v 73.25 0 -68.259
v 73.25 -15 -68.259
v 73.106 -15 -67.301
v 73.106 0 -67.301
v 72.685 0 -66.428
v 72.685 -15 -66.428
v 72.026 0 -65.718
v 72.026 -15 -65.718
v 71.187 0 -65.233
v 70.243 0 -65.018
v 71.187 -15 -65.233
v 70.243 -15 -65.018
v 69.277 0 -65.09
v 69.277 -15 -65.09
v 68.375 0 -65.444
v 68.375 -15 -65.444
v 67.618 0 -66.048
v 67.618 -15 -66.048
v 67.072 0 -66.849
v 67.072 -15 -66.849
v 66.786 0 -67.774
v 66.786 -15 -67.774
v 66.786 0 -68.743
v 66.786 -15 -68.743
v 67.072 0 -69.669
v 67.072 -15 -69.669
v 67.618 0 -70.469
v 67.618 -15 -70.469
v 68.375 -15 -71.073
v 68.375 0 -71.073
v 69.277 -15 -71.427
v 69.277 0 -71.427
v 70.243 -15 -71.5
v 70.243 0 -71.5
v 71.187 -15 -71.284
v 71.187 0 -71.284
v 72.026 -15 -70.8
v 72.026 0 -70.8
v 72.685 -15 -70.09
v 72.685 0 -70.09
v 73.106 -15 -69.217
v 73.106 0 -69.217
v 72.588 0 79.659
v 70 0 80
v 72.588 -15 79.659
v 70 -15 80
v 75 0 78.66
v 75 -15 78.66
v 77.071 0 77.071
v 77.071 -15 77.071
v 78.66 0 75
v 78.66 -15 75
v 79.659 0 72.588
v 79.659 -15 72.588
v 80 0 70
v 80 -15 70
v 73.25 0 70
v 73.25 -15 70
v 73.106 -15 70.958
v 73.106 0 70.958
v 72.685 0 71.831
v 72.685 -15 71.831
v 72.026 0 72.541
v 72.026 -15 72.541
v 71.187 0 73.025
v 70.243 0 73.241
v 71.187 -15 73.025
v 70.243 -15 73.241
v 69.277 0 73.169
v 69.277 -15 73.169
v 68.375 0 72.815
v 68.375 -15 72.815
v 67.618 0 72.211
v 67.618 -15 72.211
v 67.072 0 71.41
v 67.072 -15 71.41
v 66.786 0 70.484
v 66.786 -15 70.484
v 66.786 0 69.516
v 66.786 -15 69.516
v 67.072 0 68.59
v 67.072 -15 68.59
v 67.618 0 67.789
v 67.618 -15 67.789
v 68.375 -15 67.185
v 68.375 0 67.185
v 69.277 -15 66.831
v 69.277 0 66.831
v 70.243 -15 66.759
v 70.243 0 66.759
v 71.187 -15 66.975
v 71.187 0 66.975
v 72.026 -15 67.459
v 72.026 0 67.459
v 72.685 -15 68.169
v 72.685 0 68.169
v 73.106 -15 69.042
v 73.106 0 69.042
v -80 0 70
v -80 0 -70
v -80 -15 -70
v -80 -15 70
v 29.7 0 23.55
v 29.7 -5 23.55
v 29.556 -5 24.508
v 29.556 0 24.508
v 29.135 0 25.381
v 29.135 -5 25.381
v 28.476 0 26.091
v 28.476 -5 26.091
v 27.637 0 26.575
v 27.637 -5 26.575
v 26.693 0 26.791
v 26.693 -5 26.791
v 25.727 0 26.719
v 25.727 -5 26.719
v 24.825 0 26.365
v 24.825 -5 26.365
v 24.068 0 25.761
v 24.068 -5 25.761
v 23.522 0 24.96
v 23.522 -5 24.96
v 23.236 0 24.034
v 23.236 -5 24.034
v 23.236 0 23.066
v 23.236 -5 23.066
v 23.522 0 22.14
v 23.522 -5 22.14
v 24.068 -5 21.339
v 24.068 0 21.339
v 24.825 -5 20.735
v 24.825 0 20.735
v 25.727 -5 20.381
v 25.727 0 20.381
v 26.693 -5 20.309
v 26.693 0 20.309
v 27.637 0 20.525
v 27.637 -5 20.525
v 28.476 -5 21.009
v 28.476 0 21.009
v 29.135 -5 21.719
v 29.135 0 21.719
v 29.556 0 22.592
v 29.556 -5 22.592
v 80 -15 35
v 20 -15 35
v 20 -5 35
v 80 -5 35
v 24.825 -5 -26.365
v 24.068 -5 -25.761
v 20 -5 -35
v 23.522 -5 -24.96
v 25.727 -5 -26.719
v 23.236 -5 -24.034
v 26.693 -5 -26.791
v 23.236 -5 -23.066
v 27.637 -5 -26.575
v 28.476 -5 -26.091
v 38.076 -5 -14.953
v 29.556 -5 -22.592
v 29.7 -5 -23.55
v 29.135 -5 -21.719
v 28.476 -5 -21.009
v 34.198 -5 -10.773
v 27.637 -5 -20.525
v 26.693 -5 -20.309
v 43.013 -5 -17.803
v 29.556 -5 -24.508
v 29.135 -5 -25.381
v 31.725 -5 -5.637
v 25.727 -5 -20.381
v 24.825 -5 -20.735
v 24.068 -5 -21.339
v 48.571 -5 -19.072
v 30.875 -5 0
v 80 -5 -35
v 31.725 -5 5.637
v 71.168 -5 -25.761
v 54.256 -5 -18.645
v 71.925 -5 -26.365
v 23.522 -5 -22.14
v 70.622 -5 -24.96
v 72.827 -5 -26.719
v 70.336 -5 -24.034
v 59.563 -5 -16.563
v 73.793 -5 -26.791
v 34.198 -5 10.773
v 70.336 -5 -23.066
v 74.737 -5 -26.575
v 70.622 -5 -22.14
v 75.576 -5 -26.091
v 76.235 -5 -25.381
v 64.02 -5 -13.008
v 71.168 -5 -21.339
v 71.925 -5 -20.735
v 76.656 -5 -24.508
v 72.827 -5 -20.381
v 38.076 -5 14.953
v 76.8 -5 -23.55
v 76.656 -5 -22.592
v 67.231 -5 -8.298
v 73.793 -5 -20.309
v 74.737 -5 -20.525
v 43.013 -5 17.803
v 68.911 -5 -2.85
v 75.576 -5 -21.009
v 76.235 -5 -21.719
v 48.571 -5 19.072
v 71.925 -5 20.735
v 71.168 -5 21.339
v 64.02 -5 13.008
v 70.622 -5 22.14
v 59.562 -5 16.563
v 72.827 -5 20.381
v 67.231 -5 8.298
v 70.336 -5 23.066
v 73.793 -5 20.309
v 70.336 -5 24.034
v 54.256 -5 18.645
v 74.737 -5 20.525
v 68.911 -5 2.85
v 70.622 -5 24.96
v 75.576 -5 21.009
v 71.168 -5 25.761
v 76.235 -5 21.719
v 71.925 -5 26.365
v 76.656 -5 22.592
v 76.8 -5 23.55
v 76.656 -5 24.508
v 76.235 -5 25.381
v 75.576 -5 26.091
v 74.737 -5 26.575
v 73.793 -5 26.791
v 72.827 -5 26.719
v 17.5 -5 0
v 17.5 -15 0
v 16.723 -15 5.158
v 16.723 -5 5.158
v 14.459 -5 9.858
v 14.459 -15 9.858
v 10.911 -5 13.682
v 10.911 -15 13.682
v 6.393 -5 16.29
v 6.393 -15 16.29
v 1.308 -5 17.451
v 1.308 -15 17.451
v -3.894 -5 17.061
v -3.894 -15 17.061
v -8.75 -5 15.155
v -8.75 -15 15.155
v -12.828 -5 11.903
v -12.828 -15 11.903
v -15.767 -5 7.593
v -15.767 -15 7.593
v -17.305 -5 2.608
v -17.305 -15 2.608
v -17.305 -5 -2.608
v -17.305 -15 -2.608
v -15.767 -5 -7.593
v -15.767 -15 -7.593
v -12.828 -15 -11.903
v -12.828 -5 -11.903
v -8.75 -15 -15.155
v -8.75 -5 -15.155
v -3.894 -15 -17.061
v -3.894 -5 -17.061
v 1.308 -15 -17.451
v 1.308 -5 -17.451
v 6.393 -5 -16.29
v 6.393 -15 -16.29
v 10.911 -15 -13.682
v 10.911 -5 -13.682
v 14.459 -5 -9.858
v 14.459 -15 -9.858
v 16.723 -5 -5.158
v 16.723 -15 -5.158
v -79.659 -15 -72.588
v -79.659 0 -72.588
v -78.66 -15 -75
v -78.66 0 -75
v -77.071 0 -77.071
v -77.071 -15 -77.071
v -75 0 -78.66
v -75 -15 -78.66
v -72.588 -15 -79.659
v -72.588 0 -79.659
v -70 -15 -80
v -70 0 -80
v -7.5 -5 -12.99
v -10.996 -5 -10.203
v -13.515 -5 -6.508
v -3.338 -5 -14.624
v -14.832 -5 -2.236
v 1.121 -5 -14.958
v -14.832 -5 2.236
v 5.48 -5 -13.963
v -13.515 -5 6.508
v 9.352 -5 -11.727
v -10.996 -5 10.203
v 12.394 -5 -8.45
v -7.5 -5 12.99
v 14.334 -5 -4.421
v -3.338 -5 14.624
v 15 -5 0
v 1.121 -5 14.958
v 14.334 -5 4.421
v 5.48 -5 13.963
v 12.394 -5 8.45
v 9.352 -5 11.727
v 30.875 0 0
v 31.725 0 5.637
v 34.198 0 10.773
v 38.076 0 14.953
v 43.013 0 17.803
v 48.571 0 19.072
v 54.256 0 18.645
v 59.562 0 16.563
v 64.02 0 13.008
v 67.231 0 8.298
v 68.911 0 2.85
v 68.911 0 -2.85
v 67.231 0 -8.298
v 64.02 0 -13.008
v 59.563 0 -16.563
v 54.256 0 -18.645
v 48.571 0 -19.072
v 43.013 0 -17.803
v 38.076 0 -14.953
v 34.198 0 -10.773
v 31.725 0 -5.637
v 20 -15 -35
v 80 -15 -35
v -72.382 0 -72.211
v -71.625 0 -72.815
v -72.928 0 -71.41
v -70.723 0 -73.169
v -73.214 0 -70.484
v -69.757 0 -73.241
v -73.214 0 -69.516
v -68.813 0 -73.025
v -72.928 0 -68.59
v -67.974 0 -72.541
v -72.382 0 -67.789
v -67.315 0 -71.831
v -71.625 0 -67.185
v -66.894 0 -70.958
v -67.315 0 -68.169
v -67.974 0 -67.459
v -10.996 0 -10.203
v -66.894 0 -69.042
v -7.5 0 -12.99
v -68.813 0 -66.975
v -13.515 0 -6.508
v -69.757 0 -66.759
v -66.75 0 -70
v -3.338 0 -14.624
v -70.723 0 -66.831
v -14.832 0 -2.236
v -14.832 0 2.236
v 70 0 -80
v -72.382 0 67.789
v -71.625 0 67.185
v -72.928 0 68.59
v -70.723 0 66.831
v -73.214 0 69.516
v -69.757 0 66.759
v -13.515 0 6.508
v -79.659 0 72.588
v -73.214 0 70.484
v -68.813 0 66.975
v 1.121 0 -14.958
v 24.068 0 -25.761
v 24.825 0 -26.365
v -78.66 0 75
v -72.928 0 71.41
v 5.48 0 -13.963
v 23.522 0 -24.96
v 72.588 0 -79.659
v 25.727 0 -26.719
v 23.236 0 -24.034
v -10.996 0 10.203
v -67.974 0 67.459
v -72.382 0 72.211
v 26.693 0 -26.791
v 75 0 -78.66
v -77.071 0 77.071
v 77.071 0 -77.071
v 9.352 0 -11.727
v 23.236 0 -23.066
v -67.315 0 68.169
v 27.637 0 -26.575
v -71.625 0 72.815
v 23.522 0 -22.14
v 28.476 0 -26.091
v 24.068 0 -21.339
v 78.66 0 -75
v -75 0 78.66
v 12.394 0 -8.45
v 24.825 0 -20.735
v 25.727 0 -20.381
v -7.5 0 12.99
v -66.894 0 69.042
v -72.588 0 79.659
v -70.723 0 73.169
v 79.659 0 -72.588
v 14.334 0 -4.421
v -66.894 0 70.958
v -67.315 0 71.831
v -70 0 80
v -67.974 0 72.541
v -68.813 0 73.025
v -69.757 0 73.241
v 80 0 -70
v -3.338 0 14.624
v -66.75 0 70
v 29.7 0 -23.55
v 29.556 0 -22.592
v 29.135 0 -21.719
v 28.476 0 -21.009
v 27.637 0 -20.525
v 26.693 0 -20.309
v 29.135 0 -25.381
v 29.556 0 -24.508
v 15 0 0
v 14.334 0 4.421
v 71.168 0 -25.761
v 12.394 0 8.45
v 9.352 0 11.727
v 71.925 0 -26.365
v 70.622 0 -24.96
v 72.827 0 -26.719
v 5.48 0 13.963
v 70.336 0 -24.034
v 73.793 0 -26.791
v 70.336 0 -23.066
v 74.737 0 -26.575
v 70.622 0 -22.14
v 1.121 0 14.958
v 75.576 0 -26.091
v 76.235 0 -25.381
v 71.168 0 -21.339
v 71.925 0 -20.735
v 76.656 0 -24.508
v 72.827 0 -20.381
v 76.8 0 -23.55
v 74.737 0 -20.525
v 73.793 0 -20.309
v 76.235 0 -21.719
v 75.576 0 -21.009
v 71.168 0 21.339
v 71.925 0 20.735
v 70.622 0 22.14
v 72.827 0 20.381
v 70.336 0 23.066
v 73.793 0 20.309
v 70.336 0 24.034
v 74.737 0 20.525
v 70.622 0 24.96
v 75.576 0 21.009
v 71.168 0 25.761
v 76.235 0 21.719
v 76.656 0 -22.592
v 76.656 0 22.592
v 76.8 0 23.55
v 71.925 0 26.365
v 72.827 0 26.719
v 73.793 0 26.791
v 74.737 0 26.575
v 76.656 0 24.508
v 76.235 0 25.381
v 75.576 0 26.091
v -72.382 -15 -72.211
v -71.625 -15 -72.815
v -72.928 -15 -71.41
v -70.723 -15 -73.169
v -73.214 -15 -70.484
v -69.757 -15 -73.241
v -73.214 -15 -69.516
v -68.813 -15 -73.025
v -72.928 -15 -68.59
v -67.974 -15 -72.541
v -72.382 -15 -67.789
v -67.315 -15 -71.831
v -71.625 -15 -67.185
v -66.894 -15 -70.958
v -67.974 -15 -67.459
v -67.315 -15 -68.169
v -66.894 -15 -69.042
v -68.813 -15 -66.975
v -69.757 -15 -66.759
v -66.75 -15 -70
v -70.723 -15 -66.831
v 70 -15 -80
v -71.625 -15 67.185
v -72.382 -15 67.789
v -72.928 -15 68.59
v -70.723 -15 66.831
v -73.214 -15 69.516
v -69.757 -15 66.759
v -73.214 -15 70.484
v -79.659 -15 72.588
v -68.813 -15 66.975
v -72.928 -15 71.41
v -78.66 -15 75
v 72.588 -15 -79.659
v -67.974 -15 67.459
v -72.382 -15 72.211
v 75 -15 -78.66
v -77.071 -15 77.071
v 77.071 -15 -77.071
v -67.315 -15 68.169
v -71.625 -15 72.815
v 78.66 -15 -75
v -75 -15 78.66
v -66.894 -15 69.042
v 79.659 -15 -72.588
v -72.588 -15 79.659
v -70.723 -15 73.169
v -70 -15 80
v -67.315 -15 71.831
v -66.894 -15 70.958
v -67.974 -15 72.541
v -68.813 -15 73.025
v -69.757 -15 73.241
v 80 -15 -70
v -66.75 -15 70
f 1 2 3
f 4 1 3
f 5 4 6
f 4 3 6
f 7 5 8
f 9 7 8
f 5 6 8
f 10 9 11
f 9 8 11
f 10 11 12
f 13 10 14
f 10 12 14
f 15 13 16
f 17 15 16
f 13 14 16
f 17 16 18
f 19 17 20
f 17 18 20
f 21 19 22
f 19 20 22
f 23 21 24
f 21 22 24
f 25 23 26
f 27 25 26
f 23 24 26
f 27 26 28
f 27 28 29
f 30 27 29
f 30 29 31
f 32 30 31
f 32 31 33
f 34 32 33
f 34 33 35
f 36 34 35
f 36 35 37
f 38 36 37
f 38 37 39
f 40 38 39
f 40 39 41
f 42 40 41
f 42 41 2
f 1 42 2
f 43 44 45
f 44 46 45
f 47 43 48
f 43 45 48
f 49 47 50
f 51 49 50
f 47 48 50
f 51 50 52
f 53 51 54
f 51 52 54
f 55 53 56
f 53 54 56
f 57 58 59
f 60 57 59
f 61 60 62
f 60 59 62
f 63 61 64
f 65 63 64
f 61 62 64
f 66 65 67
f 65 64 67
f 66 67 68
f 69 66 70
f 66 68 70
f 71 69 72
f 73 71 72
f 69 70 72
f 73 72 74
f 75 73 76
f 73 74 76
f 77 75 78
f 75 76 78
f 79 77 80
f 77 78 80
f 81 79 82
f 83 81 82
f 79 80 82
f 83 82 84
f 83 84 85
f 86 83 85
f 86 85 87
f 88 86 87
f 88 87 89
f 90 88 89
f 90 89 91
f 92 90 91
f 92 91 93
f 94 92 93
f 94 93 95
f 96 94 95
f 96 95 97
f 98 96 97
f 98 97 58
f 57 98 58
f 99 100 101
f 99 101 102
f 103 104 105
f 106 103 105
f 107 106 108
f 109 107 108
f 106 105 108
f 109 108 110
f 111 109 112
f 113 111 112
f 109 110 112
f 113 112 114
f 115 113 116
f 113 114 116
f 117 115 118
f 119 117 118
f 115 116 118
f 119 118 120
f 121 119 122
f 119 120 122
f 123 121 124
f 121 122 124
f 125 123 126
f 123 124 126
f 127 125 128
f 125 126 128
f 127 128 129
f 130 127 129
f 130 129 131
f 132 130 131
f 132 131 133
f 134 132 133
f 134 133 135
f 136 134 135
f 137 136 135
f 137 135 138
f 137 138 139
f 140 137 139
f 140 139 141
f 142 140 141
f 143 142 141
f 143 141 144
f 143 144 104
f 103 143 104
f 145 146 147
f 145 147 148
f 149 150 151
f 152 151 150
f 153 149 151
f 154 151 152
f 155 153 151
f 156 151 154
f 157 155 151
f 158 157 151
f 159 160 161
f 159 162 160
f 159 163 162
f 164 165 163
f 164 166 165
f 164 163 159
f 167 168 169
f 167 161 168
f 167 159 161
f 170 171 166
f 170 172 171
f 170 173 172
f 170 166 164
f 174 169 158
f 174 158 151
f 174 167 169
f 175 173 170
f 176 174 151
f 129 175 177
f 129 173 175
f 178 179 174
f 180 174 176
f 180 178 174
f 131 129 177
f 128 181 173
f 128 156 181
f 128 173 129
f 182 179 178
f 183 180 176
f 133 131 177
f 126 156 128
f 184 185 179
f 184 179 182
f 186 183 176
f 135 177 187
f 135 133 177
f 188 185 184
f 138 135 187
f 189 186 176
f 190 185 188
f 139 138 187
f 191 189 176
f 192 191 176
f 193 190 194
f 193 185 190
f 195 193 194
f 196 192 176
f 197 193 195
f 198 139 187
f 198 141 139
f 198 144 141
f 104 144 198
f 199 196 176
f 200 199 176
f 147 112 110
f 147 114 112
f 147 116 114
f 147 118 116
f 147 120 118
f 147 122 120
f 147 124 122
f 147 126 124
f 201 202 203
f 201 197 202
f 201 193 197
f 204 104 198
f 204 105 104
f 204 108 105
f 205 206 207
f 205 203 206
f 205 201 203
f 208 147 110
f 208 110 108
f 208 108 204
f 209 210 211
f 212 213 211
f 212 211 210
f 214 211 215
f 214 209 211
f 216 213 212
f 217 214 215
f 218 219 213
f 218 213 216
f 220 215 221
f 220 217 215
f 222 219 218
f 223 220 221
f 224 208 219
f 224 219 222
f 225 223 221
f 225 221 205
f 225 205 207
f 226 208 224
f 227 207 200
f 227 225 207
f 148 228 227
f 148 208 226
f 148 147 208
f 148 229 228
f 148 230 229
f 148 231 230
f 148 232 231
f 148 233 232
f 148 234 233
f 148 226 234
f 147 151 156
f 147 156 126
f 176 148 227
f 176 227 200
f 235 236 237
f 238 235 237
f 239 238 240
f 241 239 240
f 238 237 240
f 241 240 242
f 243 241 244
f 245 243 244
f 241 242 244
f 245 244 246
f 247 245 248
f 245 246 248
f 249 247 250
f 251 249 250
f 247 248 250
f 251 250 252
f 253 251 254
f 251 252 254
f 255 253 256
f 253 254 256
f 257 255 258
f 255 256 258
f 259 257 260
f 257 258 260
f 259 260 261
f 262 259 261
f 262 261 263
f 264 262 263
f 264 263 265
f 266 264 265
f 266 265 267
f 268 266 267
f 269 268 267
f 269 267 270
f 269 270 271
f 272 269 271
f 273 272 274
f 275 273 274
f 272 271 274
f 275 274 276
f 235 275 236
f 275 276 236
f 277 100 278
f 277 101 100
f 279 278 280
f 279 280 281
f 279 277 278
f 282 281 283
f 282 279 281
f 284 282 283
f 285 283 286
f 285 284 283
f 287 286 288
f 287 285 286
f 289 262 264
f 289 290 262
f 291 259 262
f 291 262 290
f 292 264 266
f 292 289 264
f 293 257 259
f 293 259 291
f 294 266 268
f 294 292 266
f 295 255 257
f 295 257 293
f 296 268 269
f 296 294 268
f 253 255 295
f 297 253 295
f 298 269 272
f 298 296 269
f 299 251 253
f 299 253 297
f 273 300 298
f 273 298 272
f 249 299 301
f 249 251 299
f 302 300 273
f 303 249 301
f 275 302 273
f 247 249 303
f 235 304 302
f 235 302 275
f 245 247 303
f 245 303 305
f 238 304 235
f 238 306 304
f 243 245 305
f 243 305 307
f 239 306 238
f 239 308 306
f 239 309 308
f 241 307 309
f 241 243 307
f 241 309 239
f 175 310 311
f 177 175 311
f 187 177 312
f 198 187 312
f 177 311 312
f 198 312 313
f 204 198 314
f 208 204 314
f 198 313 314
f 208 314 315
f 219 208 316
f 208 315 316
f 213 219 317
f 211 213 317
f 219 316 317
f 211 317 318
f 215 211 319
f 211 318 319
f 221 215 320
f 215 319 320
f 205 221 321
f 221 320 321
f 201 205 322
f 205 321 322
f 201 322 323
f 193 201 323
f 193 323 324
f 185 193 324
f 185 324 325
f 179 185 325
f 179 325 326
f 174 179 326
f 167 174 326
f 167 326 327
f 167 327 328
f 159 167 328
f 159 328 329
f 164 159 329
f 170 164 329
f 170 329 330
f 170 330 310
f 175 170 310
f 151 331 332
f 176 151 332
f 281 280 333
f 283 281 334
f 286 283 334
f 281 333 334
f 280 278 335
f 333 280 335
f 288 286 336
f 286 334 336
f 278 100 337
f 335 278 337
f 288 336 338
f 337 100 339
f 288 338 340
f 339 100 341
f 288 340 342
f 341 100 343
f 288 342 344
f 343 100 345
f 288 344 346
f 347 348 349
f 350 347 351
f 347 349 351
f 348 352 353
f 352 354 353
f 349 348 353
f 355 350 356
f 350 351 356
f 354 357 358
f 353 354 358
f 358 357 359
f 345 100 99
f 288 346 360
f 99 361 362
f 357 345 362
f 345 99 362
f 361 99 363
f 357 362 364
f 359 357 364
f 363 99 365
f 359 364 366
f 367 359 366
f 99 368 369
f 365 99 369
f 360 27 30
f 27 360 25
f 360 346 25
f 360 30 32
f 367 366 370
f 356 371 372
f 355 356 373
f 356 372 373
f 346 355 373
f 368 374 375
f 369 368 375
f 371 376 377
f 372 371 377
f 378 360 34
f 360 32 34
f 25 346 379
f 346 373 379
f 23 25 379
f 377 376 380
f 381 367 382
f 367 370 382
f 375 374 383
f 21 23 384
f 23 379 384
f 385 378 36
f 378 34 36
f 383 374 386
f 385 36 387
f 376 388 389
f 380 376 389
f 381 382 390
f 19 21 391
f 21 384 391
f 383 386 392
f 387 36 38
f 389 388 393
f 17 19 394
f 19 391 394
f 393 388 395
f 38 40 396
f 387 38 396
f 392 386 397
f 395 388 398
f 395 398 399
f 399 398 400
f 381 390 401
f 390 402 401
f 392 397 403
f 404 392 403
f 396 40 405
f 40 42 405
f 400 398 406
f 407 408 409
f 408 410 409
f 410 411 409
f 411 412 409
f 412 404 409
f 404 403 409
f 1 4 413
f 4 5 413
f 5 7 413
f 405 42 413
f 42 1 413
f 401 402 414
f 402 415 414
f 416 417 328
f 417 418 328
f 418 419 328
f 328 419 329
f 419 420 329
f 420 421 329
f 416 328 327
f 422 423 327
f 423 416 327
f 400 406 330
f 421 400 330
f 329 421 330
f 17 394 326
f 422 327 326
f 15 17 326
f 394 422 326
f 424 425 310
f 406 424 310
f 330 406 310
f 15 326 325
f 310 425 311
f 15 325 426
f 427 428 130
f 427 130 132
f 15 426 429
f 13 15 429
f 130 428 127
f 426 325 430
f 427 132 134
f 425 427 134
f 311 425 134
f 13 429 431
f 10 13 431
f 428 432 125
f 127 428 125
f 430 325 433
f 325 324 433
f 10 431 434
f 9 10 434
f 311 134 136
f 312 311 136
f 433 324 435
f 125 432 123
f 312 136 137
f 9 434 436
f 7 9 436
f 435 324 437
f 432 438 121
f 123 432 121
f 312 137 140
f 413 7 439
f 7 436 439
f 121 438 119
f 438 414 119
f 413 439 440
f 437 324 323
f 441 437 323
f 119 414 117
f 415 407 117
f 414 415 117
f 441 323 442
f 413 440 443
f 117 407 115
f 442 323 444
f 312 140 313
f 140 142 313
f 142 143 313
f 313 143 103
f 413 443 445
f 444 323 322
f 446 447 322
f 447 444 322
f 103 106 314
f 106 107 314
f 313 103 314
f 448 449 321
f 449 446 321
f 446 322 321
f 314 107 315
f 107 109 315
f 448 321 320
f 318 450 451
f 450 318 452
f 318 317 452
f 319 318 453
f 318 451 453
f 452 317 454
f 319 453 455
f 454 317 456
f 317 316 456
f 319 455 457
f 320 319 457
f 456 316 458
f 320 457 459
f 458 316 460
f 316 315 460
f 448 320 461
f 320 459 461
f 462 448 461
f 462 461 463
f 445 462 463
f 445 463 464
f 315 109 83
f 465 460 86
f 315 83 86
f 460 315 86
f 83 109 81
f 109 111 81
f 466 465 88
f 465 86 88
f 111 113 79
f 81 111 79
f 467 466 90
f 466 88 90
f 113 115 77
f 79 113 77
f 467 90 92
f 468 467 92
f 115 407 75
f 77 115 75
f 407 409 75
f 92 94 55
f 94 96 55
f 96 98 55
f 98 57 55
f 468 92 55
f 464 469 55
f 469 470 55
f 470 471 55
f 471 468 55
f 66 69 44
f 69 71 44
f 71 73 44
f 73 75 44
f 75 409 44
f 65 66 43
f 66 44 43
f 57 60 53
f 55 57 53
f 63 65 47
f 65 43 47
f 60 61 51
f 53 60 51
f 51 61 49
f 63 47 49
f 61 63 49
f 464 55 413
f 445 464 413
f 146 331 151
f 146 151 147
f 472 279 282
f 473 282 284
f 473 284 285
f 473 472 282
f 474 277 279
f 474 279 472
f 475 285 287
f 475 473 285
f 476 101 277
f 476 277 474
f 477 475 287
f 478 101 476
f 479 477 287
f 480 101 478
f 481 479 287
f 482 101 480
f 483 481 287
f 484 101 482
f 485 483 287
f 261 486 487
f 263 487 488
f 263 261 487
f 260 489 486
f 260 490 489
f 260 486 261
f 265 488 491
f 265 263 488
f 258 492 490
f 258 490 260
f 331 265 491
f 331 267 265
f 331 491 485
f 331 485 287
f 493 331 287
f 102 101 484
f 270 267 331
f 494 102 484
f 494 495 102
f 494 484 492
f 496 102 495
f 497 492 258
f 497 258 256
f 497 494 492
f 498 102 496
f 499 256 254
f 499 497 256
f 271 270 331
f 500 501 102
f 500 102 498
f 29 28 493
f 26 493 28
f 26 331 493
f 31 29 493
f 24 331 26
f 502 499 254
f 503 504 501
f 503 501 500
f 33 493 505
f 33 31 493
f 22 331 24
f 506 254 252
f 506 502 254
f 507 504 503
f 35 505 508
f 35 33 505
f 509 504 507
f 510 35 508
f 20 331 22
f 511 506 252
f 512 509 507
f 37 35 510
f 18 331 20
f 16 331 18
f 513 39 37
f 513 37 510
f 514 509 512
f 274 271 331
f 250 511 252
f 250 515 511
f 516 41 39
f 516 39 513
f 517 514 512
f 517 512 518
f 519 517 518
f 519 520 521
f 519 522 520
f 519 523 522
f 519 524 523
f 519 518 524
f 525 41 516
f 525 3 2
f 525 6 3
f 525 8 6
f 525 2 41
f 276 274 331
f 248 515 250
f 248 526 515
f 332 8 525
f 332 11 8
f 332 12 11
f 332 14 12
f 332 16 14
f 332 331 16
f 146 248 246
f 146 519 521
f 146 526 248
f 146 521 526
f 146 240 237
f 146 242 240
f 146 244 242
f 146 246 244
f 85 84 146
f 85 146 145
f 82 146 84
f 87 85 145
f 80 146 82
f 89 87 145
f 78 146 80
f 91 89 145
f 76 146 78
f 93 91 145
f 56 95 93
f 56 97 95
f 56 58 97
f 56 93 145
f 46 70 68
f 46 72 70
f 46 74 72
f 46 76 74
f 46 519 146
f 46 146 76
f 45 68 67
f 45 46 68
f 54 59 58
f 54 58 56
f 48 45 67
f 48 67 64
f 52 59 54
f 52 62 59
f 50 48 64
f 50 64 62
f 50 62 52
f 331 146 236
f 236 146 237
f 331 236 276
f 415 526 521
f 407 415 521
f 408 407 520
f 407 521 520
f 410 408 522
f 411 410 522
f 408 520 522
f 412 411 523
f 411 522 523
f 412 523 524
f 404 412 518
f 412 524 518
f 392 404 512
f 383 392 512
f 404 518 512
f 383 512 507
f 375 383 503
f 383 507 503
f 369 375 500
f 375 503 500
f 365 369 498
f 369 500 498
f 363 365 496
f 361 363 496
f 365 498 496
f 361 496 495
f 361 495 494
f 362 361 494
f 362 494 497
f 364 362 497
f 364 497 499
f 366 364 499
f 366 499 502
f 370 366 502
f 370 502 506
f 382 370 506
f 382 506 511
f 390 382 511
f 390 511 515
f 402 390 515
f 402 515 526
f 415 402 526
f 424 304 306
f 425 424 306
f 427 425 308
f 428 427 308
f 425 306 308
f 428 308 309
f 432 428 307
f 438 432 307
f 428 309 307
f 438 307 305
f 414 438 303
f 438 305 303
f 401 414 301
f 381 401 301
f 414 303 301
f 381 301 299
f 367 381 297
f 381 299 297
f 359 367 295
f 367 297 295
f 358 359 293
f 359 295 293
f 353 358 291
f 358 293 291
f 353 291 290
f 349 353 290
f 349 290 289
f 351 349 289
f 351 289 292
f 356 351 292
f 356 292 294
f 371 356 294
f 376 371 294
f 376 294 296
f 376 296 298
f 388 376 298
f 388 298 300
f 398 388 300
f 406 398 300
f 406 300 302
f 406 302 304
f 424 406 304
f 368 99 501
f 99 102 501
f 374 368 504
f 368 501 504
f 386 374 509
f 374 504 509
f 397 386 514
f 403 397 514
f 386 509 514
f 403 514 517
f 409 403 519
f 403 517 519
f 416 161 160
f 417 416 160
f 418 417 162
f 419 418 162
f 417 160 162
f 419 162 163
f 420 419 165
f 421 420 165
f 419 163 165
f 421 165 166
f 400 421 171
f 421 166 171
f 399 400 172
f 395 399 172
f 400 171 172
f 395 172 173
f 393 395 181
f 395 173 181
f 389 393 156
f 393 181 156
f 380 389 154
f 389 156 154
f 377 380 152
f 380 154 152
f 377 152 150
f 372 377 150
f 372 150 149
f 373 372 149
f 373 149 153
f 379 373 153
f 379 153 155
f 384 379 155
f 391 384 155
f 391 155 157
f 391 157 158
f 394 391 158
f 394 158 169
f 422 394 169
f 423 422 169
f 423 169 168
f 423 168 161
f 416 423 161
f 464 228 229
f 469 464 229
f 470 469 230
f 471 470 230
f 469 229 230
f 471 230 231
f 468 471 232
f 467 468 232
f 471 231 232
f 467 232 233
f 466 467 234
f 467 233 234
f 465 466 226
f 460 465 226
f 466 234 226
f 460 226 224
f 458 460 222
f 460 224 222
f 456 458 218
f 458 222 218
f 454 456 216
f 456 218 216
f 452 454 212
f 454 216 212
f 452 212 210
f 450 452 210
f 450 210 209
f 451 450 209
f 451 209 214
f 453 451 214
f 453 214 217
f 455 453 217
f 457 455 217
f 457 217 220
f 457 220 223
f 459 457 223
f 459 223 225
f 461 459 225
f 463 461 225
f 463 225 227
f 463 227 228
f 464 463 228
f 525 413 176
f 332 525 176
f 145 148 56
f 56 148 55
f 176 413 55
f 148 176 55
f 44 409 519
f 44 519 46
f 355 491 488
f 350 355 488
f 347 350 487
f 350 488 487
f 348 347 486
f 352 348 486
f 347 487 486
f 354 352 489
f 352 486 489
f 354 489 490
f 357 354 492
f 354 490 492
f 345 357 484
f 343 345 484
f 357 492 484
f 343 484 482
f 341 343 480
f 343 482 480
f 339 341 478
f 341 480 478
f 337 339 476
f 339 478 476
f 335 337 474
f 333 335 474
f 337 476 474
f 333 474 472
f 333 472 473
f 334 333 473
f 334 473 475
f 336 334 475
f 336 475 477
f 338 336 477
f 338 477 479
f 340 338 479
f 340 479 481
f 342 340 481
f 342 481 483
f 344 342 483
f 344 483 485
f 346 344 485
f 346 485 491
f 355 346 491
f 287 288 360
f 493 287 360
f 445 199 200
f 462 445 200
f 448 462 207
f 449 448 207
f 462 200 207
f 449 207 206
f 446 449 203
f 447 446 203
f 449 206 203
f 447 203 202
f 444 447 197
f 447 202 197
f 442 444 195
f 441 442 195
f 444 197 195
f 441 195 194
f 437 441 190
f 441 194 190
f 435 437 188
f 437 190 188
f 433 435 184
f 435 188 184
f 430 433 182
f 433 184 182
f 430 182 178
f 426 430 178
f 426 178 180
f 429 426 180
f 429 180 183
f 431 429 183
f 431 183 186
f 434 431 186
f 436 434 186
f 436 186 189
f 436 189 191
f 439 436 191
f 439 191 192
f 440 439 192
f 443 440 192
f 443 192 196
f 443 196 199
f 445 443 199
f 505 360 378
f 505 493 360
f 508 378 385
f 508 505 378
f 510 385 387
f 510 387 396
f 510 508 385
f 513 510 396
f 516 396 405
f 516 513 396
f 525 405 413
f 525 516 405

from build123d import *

# Parameters (mm, degrees)
F0_W      = 160
F0_H      = 160
F1_DEPTH  = 15
F2_R      = 15
F3_DEPTH  = 25
F4_R      = 17.5
F5_DEPTH  = 10
F6_R      = 10
F7_W      = 60
F7_H      = 70
F8_DEPTH  = 10
F9_R      = 19.125
F10_DEPTH = 25
F11_R     = 3.25
F12_DEPTH = 25
F13_R     = 3.25
F14_DEPTH = 25


with BuildPart() as f1:
    # F0 (on Front) → F1 (new body)
    with BuildSketch(Plane.XZ):
        Rectangle(F0_W, F0_H)
    extrude(amount=F1_DEPTH)

    # F2 (on face) → F3 (cut)
    with BuildSketch(Plane.XZ.offset(15)):
        Circle(F2_R)
    extrude(amount=-F3_DEPTH, mode=Mode.SUBTRACT)

    # F4 (on face) → F5 (cut)
    with BuildSketch(Plane.XZ.offset(15)):
        Circle(F4_R)
    extrude(amount=-F5_DEPTH, mode=Mode.SUBTRACT)

    # F6
    f6_edges = [f1.edges().sort_by_distance(p)[0] for p in [
        (80, -7.5, 80),
        (80, -7.5, -80),
        (-80, -7.5, -80),
        (-80, -7.5, 80),
    ]]
    fillet(f6_edges, radius=F6_R)

    # F7 (on face) → F8 (cut)
    with BuildSketch(Plane.XZ.offset(15)):
        with Locations((50, 0)):
            Rectangle(F7_W, F7_H)
    extrude(amount=-F8_DEPTH, mode=Mode.SUBTRACT)

    # F9 (on face) → F10 (cut)
    with BuildSketch(Plane(origin=(0, 0, 0), x_dir=(-1, 0, 0), z_dir=(0, 1, 0))):
        with Locations((-50, 0)):
            Circle(F9_R)
    extrude(amount=-F10_DEPTH, mode=Mode.SUBTRACT)

    # F11 (on face) → F12 (cut)
    with BuildSketch(Plane.XZ.offset(5)):
        with Locations((26.45, 23.55)):
            Circle(F11_R)
        with Locations((26.45, -23.55)):
            Circle(F11_R)
        with Locations((73.55, -23.55)):
            Circle(F11_R)
        with Locations((73.55, 23.55)):
            Circle(F11_R)
    extrude(amount=-F12_DEPTH, mode=Mode.SUBTRACT)

    # F13 (on face) → F14 (cut)
    with BuildSketch(Plane.XZ.offset(15)):
        with Locations((70, 70)):
            Circle(F13_R)
        with Locations((70, -68.258837)):
            Circle(F13_R)
        with Locations((-70, -70)):
            Circle(F13_R)
        with Locations((-70, 70)):
            Circle(F13_R)
    extrude(amount=-F14_DEPTH, mode=Mode.SUBTRACT)


solid = f1.part
